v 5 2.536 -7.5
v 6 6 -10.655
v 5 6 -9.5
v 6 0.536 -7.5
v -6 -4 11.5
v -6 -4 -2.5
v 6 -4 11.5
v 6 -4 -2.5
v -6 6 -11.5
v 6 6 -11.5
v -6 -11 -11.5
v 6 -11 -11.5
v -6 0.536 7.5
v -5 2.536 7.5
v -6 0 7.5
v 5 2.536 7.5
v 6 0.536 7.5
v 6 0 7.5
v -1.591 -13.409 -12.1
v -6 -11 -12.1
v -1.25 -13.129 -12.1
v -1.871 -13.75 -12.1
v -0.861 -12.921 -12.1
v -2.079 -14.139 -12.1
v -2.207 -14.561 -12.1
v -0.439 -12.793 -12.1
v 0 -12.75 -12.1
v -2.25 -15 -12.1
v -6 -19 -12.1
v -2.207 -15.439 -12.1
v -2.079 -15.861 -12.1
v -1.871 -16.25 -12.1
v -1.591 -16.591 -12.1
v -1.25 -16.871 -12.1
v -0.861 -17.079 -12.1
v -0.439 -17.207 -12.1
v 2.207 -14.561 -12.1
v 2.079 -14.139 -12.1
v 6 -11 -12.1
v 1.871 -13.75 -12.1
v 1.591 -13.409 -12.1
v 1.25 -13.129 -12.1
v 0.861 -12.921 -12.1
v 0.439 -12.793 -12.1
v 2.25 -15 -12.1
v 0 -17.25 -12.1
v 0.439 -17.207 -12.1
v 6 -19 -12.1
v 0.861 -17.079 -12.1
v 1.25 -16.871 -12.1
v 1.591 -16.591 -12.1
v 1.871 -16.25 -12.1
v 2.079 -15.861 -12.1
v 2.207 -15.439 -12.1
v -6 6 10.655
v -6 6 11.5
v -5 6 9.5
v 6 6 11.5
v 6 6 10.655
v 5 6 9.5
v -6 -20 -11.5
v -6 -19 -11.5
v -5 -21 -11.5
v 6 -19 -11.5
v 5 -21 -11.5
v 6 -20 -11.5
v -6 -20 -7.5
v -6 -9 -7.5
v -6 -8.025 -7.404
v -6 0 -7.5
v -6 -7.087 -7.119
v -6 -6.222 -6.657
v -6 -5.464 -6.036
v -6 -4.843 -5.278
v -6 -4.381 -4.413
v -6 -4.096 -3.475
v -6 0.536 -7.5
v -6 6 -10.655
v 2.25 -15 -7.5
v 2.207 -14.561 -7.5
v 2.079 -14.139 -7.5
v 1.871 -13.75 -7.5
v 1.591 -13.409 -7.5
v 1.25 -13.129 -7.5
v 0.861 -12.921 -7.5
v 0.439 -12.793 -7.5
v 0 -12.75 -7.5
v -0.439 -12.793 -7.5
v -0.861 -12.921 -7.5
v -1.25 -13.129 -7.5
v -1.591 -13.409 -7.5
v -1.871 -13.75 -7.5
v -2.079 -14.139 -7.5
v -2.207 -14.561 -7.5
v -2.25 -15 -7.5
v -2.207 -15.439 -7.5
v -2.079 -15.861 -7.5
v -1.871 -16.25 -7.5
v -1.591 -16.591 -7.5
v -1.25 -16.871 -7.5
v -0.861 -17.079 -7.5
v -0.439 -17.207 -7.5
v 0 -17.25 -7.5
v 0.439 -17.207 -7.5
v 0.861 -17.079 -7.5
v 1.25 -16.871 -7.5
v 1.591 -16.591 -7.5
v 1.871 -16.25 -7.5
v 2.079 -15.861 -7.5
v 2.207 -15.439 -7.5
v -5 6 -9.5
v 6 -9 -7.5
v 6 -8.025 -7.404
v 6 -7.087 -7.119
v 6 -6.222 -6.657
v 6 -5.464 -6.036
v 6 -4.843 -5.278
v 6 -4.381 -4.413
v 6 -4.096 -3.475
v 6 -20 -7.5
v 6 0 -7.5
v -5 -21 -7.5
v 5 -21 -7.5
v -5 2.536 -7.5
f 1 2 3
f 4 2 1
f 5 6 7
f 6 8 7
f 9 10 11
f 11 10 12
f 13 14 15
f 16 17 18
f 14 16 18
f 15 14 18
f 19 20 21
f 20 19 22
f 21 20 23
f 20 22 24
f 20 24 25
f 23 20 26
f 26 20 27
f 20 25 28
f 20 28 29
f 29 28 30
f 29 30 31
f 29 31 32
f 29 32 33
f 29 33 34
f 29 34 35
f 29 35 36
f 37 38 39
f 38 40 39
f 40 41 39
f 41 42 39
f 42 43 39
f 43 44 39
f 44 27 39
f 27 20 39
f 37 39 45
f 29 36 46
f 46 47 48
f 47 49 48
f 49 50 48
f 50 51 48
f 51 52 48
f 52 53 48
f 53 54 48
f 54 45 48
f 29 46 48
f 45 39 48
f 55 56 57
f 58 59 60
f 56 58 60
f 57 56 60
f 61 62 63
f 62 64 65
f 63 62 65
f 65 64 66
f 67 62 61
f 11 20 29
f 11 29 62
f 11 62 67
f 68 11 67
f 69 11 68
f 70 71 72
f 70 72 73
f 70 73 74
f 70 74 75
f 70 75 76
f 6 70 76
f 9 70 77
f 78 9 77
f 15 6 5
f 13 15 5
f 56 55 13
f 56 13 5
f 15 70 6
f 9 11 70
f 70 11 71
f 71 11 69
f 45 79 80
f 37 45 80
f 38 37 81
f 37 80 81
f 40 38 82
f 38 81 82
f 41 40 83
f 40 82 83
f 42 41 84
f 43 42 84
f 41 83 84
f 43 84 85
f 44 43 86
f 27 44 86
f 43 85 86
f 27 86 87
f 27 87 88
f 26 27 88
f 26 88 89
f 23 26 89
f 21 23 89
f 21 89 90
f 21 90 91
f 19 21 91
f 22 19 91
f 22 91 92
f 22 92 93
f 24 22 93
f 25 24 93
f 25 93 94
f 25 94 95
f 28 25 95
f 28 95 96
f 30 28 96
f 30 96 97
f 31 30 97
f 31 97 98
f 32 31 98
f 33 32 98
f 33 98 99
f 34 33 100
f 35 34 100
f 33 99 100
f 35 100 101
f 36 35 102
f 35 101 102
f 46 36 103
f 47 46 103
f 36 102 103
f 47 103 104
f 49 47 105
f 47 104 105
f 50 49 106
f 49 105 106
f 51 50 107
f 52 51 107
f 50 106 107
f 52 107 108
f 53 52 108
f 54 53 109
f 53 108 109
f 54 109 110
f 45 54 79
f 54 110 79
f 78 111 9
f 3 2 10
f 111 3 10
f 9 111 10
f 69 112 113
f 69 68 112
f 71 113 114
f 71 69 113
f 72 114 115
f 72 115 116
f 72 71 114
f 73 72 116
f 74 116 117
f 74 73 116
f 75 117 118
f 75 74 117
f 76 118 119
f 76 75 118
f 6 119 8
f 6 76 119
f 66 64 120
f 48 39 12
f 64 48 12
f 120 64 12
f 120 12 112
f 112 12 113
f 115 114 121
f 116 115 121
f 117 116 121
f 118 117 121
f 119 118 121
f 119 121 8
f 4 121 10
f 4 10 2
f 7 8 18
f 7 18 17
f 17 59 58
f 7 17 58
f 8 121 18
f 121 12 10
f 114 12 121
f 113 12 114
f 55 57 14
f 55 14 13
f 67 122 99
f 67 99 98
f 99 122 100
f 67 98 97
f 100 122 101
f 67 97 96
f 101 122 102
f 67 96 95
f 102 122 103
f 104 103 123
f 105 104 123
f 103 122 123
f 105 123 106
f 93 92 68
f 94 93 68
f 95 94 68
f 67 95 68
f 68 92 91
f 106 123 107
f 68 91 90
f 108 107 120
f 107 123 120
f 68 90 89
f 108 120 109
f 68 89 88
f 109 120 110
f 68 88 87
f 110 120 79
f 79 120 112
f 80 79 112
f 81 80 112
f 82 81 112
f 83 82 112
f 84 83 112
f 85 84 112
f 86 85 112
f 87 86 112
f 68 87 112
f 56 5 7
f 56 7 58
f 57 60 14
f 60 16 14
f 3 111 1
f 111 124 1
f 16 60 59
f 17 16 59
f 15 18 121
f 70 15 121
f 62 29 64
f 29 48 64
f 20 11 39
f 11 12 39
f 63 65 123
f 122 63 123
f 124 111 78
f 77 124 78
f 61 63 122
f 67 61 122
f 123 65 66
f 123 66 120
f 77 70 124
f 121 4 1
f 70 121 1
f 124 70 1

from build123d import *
from OCP.BRepFilletAPI import BRepFilletAPI_MakeChamfer

# Parameters (mm, degrees)
BOSS_EXTRUDE1_DEPTH = 6
SKETCH2_R           = 2.25
CUT_EXTRUDE1_DEPTH  = 29.948229652
CHAMFER1_SIZE       = 2
CHAMFER1_SIZE2      = 3.464101615
CHAMFER3_SIZE       = 1
CHAMFER4_SIZE       = 1
FILLET1_R           = 5


with BuildPart() as part:
    # Sketch1 → Boss-Extrude1 (new, symmetric)
    with BuildSketch(Plane(origin=(0, 0, 0), x_dir=(0, 0, -1), z_dir=(1, 0, 0))):
        Polygon((7.5, 6), (11.5, 6), (11.5, -11), (12.1, -11), (12.1, -19), (11.5, -19), (11.5, -21), (7.5, -21), (7.5, -4), (-11.5, -4), (-11.5, 6), (-7.5, 6), (-7.5, 0), (7.5, 0), align=None)
    extrude(amount=BOSS_EXTRUDE1_DEPTH, both=True)

    # Sketch2 → Cut-Extrude1 (cut, through all)
    with BuildSketch(Plane.XY.offset(-7.5)):
        with Locations((0, -15)):
            Circle(SKETCH2_R)
    extrude(amount=-CUT_EXTRUDE1_DEPTH, mode=Mode.SUBTRACT)

    # Chamfer1: one chamfer whose edges measure the first distance from different faces: ONE call of the kernel's chamfer builder (chamfer() names one face for all edges)
    chamfer1_edges_1 = [part.edges().sort_by_distance(p)[0] for p in [
        (0, 6, -7.5),
    ]]
    chamfer1_side_1 = [part.faces().sort_by_distance(p)[0] for p in [
        (0, 6, -9.5),
    ]]
    chamfer1_edges_2 = [part.edges().sort_by_distance(p)[0] for p in [
        (0, 6, 7.5),
    ]]
    chamfer1_side_2 = [part.faces().sort_by_distance(p)[0] for p in [
        (0, 6, 9.5),
    ]]
    chamfer1 = BRepFilletAPI_MakeChamfer(part.part.solid().wrapped)
    for e in chamfer1_edges_1:
        chamfer1.Add(CHAMFER1_SIZE, CHAMFER1_SIZE2, e.wrapped, chamfer1_side_1[0].wrapped)  # the first distance lies on this face
    for e in chamfer1_edges_2:
        chamfer1.Add(CHAMFER1_SIZE, CHAMFER1_SIZE2, e.wrapped, chamfer1_side_2[0].wrapped)  # the first distance lies on this face
    add(Compound.cast(chamfer1.Shape()), mode=Mode.REPLACE)

    # Chamfer3
    chamfer3_edges = [part.edges().sort_by_distance(p)[0] for p in [
        (-6, 4.267949192, -8.5),
        (-6, 4.267949192, 8.5),
        (6, 4.267949192, -8.5),
        (6, 4.267949192, 8.5),
    ]]
    chamfer(chamfer3_edges, length=CHAMFER3_SIZE)

    # Chamfer4
    chamfer4_edges = [part.edges().sort_by_distance(p)[0] for p in [
        (-6, -21, -9.5),
        (6, -21, -9.5),
    ]]
    chamfer(chamfer4_edges, length=CHAMFER4_SIZE)

    # Fillet1
    fillet1_edges = [part.edges().sort_by_distance(p)[0] for p in [
        (0, -4, -7.5),
    ]]
    fillet(fillet1_edges, radius=FILLET1_R)


solid = part.part
